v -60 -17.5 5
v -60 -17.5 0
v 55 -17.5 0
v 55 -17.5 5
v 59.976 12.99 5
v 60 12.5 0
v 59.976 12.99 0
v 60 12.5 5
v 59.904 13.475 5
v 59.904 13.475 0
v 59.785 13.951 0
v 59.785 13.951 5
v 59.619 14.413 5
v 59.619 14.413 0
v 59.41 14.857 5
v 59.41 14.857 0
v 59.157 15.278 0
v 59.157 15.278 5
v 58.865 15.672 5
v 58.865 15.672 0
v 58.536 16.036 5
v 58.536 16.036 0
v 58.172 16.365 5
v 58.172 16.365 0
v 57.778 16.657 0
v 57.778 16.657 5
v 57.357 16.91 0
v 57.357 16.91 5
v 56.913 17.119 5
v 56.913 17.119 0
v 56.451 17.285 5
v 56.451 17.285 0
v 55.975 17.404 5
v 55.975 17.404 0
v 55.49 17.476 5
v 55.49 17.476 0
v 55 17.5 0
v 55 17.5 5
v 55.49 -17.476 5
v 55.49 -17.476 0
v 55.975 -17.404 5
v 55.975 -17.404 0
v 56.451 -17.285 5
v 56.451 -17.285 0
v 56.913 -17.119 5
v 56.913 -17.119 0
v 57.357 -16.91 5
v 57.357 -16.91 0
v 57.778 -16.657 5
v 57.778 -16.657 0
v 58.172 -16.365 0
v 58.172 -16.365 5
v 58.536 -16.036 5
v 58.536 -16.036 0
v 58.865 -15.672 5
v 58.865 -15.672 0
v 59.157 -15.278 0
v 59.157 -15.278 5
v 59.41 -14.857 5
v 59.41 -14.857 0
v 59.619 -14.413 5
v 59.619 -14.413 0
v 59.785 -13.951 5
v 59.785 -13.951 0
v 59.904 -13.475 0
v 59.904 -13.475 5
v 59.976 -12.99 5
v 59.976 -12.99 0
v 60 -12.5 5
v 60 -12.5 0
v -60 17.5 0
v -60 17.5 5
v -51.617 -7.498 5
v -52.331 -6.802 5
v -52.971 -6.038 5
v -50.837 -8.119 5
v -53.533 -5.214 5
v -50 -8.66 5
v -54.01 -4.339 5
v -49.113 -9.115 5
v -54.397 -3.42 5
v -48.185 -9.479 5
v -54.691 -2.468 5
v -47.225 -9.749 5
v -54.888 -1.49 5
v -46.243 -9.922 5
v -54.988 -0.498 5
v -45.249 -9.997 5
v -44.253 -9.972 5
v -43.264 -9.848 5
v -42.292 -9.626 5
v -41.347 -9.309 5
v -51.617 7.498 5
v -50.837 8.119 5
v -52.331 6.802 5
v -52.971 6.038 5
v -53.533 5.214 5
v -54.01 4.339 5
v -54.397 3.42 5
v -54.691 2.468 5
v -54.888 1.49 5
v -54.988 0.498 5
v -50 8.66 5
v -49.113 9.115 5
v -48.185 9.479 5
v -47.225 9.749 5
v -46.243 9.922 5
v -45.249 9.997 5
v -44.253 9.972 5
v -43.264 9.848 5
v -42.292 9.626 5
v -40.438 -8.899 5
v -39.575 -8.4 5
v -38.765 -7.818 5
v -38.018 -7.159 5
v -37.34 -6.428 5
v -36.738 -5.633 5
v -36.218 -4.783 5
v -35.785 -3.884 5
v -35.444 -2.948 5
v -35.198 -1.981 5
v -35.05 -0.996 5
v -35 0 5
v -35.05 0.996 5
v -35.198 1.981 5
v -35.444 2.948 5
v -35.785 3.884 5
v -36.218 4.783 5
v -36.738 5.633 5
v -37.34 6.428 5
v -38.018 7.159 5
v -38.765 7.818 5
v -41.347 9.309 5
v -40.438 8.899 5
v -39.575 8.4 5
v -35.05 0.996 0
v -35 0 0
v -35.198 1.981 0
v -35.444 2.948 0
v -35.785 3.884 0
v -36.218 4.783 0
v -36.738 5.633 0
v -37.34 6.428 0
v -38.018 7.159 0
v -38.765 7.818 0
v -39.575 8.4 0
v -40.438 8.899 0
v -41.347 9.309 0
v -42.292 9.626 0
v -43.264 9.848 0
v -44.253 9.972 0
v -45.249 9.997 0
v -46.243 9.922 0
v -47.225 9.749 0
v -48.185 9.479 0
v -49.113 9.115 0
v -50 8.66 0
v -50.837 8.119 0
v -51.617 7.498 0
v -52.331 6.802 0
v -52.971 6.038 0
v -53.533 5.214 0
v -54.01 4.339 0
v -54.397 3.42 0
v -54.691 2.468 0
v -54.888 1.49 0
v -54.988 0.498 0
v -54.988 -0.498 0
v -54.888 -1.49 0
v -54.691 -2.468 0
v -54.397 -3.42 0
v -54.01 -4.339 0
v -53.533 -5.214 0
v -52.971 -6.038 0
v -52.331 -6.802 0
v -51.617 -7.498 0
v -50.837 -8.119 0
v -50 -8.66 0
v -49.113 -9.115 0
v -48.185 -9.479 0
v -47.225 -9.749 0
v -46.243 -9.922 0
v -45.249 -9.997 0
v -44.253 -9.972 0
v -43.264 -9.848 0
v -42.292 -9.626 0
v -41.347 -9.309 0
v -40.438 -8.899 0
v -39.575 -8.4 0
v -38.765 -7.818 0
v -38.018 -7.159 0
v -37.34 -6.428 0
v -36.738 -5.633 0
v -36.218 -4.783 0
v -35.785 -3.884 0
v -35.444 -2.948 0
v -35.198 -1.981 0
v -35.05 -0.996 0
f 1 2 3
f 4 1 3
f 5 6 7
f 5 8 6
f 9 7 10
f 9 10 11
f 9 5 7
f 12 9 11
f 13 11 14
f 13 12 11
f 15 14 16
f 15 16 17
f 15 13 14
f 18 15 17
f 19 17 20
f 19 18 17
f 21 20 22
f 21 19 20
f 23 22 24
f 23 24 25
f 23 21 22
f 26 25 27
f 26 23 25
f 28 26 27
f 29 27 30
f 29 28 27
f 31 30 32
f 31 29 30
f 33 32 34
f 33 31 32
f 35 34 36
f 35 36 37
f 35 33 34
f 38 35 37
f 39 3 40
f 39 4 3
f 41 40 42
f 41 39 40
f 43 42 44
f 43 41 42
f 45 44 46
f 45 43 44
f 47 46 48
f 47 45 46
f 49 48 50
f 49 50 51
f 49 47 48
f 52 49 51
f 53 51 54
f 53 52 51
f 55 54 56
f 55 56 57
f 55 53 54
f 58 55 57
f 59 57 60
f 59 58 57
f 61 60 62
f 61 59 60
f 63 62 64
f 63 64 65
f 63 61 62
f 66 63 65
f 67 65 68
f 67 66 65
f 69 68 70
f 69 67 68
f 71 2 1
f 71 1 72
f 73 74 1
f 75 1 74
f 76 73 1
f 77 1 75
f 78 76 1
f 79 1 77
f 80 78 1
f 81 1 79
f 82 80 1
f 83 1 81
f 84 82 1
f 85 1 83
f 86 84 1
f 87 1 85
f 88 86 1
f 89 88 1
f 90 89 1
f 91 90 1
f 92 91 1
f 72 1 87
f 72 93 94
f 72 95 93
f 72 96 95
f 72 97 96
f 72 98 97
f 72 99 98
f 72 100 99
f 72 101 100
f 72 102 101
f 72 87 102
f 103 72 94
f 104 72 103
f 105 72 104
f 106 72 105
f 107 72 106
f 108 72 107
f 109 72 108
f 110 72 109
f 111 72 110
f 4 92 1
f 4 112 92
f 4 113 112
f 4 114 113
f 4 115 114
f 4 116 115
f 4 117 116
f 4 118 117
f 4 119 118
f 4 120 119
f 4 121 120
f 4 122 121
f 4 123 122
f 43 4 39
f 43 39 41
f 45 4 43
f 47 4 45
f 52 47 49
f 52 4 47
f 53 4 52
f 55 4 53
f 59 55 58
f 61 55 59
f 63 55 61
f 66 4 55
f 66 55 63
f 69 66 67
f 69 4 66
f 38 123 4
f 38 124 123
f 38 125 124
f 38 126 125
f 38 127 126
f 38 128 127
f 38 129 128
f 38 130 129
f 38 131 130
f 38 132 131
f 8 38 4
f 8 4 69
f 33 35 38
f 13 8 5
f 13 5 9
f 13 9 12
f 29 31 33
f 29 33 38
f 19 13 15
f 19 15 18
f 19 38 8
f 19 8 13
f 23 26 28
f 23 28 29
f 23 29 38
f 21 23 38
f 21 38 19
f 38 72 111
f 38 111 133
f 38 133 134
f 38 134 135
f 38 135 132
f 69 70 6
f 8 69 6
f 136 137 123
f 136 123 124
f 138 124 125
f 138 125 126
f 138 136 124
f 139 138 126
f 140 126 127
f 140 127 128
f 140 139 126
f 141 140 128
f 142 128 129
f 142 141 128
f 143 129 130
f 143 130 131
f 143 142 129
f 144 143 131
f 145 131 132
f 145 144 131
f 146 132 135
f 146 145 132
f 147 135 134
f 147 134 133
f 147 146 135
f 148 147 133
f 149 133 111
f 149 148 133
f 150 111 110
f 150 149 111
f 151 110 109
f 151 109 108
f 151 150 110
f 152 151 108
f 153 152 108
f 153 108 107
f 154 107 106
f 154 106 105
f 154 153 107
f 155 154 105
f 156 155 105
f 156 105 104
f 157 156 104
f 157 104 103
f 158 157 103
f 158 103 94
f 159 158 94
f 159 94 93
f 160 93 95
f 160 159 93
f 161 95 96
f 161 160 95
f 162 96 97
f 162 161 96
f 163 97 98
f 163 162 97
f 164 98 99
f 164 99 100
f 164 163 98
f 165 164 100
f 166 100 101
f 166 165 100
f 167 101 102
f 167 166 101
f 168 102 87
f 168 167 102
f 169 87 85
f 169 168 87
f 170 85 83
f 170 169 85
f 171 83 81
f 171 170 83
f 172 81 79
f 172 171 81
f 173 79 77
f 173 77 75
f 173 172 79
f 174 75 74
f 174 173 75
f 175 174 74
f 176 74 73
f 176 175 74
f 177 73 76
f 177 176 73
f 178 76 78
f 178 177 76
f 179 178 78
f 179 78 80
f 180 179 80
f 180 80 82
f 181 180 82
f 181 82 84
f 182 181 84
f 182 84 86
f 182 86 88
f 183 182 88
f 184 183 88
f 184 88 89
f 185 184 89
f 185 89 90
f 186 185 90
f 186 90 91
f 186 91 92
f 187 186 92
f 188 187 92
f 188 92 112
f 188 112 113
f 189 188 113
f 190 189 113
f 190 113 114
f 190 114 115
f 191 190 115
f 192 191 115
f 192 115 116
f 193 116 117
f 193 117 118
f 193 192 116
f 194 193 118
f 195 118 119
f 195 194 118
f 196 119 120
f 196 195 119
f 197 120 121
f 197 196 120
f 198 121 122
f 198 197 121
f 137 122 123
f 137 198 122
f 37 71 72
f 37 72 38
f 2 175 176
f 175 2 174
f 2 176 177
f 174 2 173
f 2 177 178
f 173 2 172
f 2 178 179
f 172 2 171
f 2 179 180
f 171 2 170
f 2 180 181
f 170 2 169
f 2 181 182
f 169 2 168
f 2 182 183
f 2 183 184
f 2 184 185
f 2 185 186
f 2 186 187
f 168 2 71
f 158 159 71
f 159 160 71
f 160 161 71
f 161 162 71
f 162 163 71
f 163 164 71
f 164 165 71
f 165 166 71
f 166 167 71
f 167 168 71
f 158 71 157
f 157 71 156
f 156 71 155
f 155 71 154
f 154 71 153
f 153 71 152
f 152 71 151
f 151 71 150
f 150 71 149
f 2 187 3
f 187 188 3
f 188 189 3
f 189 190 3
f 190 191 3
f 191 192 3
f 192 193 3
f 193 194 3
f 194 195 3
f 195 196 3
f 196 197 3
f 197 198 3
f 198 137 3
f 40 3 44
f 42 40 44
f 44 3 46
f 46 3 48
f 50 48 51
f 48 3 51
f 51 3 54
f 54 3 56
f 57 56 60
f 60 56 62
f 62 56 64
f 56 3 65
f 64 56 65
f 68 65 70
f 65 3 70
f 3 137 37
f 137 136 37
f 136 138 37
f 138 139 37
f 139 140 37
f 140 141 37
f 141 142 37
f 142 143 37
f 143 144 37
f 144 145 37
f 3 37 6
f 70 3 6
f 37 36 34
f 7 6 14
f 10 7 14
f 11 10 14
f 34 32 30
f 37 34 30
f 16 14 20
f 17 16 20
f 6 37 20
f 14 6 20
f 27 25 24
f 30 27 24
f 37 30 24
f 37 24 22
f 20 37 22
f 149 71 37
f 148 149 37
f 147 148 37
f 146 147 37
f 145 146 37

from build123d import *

# Parameters (mm, degrees)
F0_W     = 120
F0_H     = 35
F0_R     = 10
F1_DEPTH = 5
F2_R     = 5
F3_R     = 5


with BuildPart() as f1:
    # F0 (on Top) → F1 (new body)
    with BuildSketch(Plane.XY):
        Rectangle(F0_W, F0_H)
        with Locations((-45, 0)):
            Circle(F0_R, mode=Mode.SUBTRACT)
    extrude(amount=F1_DEPTH)

    # F2
    f2_edges = [f1.edges().sort_by_distance(p)[0] for p in [
        (60, -17.5, 2.5),
    ]]
    fillet(f2_edges, radius=F2_R)

    # F3
    f3_edges = [f1.edges().sort_by_distance(p)[0] for p in [
        (60, 17.5, 2.5),
    ]]
    fillet(f3_edges, radius=F3_R)


solid = f1.part
